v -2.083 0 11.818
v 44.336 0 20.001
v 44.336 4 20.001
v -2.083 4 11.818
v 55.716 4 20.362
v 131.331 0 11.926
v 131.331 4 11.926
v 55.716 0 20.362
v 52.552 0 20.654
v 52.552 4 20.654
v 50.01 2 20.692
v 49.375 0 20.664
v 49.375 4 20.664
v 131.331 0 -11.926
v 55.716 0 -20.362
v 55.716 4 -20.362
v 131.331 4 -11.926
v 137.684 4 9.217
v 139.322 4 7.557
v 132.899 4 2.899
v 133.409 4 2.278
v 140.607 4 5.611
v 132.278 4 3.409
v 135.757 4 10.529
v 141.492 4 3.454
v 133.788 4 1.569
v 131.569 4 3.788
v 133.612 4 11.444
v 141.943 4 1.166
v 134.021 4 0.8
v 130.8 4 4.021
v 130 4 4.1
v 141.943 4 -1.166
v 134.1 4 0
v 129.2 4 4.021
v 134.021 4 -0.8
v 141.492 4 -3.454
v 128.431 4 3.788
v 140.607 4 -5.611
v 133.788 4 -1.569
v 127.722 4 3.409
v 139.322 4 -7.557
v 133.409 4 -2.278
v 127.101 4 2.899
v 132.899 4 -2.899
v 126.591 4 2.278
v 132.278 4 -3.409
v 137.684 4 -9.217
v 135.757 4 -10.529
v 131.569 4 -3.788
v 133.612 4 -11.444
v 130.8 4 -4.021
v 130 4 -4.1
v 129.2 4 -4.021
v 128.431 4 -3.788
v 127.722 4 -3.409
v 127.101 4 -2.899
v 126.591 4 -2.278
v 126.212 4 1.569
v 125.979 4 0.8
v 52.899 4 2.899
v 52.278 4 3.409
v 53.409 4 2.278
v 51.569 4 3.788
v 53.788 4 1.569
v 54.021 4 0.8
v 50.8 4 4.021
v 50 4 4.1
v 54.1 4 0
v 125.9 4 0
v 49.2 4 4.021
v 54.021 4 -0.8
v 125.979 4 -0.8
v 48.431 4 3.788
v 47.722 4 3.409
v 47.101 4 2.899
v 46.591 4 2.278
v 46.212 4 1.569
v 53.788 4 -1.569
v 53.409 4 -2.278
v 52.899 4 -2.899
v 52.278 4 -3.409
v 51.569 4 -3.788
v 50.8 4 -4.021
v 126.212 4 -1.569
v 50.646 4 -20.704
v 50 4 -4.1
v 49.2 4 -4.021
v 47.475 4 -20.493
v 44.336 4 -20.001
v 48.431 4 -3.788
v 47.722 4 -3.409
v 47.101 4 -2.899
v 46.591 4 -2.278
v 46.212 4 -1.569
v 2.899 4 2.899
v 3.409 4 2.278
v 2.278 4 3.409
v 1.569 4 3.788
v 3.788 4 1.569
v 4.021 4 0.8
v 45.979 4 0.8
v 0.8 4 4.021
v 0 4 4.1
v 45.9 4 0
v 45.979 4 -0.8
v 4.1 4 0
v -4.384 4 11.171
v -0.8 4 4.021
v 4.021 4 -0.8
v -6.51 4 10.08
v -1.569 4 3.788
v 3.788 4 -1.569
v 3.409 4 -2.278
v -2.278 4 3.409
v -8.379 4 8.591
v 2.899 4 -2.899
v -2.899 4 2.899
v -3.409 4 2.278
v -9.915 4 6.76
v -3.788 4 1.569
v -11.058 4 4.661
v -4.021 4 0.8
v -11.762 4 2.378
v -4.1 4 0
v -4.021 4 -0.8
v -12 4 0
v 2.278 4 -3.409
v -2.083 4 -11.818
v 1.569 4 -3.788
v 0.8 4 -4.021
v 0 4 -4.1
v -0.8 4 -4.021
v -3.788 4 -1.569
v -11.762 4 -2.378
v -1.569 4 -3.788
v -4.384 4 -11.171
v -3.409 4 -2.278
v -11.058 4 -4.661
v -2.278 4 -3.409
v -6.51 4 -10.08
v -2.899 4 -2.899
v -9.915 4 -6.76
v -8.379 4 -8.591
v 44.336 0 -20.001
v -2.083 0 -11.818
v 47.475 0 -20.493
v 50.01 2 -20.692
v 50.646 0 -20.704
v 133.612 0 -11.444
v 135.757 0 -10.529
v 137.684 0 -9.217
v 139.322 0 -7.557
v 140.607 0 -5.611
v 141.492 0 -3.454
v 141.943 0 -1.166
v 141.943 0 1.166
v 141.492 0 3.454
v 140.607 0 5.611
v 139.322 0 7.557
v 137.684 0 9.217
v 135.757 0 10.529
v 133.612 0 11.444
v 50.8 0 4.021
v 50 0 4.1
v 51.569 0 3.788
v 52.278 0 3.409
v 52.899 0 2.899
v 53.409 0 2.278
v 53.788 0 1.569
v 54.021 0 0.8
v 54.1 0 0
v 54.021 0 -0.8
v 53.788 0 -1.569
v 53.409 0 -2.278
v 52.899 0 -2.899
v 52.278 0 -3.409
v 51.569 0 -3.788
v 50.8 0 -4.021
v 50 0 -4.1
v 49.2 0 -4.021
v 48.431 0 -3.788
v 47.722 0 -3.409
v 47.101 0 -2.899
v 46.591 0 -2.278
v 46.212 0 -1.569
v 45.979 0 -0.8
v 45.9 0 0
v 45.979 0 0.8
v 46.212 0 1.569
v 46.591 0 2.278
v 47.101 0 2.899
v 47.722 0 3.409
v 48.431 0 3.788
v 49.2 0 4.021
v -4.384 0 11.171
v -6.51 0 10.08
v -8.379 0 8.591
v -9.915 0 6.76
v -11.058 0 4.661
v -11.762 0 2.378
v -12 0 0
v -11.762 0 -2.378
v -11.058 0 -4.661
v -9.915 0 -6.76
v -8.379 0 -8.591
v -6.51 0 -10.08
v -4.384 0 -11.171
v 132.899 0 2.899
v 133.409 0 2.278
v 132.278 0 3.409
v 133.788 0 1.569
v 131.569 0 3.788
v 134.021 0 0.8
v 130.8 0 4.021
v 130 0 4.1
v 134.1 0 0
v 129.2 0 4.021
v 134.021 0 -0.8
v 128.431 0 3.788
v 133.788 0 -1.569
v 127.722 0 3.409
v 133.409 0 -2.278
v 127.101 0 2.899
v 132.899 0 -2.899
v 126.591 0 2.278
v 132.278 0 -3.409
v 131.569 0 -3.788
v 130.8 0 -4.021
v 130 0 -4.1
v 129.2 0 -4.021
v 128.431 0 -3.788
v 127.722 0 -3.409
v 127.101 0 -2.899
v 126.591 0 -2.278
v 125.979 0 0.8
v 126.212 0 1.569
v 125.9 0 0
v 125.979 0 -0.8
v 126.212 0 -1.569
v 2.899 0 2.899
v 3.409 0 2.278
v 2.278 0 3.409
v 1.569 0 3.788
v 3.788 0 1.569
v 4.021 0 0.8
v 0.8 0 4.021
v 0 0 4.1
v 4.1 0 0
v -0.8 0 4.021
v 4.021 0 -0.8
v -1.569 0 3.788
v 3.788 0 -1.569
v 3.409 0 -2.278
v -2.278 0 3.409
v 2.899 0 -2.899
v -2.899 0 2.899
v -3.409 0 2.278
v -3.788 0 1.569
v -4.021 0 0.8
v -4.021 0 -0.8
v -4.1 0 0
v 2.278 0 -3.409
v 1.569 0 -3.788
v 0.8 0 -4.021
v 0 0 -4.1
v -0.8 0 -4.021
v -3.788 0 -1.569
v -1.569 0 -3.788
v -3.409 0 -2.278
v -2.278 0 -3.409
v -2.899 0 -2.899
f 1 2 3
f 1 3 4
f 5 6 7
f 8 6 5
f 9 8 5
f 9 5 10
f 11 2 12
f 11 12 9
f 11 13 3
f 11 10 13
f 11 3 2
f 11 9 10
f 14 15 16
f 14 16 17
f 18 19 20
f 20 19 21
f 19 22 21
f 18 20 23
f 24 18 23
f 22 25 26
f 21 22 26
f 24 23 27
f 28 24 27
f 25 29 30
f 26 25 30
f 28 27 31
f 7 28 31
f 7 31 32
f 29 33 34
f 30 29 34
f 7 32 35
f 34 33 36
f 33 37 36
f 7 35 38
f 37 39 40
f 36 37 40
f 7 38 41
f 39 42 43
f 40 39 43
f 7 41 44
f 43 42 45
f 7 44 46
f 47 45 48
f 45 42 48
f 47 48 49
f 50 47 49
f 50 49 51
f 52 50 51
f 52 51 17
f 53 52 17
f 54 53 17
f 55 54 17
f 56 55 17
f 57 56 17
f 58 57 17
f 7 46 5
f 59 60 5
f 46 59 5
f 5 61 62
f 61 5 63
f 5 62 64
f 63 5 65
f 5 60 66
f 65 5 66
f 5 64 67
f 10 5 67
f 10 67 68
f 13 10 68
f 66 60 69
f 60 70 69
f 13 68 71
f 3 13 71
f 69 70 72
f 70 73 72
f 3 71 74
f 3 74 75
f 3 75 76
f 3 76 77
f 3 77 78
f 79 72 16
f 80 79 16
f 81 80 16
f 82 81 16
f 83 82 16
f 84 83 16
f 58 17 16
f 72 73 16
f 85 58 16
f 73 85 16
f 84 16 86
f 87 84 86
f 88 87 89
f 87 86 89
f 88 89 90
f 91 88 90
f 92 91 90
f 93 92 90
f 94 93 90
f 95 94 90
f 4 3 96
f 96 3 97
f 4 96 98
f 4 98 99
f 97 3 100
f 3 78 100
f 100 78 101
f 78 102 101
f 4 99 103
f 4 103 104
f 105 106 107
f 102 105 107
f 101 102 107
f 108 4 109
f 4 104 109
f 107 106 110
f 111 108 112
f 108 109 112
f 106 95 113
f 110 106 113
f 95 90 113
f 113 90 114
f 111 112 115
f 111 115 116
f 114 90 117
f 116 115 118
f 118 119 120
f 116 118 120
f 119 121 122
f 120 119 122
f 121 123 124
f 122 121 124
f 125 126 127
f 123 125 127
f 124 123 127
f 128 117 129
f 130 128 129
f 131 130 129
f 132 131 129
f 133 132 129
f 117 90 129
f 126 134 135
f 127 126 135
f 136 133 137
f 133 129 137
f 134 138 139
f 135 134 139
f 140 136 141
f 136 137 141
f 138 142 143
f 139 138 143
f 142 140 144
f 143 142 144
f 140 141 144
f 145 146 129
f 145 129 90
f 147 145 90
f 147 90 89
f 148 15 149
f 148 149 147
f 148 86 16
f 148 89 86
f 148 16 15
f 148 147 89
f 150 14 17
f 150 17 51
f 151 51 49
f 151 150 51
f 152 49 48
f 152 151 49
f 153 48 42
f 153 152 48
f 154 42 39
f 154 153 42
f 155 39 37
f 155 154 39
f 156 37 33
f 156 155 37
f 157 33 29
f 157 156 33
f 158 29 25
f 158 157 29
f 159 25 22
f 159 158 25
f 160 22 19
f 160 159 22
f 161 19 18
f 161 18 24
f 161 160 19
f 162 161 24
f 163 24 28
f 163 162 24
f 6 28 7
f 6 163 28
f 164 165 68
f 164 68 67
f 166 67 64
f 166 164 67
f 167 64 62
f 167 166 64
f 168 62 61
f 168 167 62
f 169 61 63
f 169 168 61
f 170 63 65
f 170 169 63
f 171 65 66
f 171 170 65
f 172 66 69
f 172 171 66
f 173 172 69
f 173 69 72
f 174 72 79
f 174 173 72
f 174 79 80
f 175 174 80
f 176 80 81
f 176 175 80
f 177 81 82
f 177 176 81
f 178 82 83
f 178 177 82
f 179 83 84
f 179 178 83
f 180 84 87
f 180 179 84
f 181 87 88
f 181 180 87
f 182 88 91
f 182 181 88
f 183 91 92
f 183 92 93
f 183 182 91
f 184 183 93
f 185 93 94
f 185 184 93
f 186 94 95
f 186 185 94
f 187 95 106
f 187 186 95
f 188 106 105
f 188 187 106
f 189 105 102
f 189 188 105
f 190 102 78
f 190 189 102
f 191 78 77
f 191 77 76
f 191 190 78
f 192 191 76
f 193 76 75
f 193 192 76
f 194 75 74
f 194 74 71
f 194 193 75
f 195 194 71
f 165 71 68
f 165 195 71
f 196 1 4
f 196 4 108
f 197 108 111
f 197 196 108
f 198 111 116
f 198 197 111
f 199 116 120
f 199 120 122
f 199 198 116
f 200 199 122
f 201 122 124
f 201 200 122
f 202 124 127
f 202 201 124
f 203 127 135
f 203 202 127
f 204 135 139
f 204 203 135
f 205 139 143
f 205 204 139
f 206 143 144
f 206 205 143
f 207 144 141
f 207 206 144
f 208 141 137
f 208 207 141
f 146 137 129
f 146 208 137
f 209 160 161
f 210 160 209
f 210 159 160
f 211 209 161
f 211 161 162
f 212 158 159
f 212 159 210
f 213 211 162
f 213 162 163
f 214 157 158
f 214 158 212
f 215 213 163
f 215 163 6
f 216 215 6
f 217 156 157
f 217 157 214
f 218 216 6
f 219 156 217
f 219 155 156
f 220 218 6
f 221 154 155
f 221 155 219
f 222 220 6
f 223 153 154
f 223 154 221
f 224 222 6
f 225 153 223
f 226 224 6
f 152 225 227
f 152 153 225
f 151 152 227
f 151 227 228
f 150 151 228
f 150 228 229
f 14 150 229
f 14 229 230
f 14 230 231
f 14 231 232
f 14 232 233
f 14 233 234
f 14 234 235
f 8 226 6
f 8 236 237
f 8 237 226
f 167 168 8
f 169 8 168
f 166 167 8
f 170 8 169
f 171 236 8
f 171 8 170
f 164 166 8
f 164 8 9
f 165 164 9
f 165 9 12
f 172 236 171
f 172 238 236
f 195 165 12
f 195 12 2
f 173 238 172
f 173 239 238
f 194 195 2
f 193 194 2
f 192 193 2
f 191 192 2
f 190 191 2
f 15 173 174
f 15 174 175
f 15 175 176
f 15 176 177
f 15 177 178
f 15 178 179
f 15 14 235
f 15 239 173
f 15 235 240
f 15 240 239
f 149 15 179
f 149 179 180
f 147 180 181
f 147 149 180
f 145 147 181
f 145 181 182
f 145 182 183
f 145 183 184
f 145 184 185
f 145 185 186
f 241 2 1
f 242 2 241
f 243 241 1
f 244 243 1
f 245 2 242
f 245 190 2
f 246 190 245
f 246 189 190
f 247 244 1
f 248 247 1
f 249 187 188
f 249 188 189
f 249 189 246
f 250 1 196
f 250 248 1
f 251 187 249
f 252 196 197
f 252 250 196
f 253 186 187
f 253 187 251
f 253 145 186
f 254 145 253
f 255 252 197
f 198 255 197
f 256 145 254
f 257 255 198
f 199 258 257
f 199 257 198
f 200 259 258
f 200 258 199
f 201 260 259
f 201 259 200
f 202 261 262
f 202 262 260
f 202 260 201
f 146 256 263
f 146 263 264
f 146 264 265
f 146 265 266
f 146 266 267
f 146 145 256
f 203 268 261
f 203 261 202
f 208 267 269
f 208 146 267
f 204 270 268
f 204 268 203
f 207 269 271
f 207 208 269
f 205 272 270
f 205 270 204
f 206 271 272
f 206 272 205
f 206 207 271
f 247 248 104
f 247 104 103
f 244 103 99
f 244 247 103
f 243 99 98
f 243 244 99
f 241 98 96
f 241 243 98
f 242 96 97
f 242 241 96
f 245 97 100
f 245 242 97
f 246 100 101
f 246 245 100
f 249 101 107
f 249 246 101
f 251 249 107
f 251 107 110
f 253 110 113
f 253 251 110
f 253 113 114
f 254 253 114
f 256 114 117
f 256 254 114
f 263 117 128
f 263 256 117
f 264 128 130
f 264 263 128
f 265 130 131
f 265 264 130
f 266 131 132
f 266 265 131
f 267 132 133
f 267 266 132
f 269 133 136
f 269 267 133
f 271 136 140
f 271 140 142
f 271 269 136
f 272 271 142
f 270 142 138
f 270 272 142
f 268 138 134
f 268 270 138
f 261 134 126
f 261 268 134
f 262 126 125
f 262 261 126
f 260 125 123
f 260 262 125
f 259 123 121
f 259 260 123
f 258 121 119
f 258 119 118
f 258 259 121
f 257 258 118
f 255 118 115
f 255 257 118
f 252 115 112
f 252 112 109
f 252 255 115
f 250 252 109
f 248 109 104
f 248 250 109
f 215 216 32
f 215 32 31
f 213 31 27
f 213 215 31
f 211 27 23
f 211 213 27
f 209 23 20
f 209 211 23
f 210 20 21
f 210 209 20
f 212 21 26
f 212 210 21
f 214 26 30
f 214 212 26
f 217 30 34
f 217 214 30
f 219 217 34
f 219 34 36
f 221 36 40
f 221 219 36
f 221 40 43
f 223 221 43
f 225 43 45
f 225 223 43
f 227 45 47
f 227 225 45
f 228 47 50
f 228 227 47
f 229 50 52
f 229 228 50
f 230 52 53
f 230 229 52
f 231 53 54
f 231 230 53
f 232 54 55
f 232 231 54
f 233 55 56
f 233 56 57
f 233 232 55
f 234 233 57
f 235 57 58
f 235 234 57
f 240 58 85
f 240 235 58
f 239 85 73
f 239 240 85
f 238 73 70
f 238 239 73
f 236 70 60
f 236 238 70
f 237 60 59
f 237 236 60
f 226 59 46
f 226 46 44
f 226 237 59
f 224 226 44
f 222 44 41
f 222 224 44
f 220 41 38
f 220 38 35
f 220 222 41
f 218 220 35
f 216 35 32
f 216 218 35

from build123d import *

# Parameters (mm, degrees)
SKETCH_1_R      = 4.1
EXTRUDE_1_DEPTH = 4


with BuildPart() as part:
    # 草图1 → 凸台-拉伸1 (new body)
    with BuildSketch(Plane(origin=(0, 0, 0), x_dir=(1, 0, 0), z_dir=(0, 1, 0))):
        with BuildLine():
            Line((-2.083455003, 11.817750008), (50, 21))
            Line((50, 21), (131.330576007, 11.926003836))
            ThreePointArc((131.330576007, 11.926003836), (142, 0), (131.330576007, -11.926003836))
            Line((131.330576007, -11.926003836), (50, -21))
            Line((50, -21), (-2.083455003, -11.817750008))
            ThreePointArc((-2.083455003, -11.817750008), (-12, 0), (-2.083455003, 11.817750008))
        make_face()
        with Locations(Location((0, 0, 0), (0, 0, 270))):
            Circle(SKETCH_1_R, mode=Mode.SUBTRACT)
        with Locations(Location((50, 0, 0), (0, 0, 270))):
            Circle(SKETCH_1_R, mode=Mode.SUBTRACT)
        with Locations(Location((130, 0, 0), (0, 0, 270))):
            Circle(SKETCH_1_R, mode=Mode.SUBTRACT)
    extrude(amount=EXTRUDE_1_DEPTH)

    # 圆角1
    # a fillet whose section is not a circle: 40 mm, written as the material it takes off along each edge
    with BuildSketch(Plane(origin=(50, -14.378648939, 21), x_dir=(0.9938336529777407, 0, -0.11088133390665686), z_dir=(0, 1, 0)), Plane(origin=(50, -14.378648939, -21), x_dir=(-0.9848125006580993, 0, 0.17362125027640163), z_dir=(0, 1, 0))) as fillet_1_piece_1:
        with BuildLine():
            add(Edge.make_bspline([(5.751459576, 0), (4.676371086, 0), (3.601282597, 0), (1.210344489, 0.06897002), (-1.141879394, 0.407188034), (-3.455389054, 1.014654044), (-4.486924042, 1.317558038), (-5.518459029, 1.620462032)], knots=[0, 0, 0, 0, 0, 0, 0.5, 0.5, 1, 1, 1, 1, 1, 1], degree=5))
            Line((-5.518459029, 1.620462032), (0, 0))
            Line((0, 0), (5.751459576, 0))
        make_face()
    extrude(amount=32.757297879, mode=Mode.SUBTRACT)


solid = part.part
